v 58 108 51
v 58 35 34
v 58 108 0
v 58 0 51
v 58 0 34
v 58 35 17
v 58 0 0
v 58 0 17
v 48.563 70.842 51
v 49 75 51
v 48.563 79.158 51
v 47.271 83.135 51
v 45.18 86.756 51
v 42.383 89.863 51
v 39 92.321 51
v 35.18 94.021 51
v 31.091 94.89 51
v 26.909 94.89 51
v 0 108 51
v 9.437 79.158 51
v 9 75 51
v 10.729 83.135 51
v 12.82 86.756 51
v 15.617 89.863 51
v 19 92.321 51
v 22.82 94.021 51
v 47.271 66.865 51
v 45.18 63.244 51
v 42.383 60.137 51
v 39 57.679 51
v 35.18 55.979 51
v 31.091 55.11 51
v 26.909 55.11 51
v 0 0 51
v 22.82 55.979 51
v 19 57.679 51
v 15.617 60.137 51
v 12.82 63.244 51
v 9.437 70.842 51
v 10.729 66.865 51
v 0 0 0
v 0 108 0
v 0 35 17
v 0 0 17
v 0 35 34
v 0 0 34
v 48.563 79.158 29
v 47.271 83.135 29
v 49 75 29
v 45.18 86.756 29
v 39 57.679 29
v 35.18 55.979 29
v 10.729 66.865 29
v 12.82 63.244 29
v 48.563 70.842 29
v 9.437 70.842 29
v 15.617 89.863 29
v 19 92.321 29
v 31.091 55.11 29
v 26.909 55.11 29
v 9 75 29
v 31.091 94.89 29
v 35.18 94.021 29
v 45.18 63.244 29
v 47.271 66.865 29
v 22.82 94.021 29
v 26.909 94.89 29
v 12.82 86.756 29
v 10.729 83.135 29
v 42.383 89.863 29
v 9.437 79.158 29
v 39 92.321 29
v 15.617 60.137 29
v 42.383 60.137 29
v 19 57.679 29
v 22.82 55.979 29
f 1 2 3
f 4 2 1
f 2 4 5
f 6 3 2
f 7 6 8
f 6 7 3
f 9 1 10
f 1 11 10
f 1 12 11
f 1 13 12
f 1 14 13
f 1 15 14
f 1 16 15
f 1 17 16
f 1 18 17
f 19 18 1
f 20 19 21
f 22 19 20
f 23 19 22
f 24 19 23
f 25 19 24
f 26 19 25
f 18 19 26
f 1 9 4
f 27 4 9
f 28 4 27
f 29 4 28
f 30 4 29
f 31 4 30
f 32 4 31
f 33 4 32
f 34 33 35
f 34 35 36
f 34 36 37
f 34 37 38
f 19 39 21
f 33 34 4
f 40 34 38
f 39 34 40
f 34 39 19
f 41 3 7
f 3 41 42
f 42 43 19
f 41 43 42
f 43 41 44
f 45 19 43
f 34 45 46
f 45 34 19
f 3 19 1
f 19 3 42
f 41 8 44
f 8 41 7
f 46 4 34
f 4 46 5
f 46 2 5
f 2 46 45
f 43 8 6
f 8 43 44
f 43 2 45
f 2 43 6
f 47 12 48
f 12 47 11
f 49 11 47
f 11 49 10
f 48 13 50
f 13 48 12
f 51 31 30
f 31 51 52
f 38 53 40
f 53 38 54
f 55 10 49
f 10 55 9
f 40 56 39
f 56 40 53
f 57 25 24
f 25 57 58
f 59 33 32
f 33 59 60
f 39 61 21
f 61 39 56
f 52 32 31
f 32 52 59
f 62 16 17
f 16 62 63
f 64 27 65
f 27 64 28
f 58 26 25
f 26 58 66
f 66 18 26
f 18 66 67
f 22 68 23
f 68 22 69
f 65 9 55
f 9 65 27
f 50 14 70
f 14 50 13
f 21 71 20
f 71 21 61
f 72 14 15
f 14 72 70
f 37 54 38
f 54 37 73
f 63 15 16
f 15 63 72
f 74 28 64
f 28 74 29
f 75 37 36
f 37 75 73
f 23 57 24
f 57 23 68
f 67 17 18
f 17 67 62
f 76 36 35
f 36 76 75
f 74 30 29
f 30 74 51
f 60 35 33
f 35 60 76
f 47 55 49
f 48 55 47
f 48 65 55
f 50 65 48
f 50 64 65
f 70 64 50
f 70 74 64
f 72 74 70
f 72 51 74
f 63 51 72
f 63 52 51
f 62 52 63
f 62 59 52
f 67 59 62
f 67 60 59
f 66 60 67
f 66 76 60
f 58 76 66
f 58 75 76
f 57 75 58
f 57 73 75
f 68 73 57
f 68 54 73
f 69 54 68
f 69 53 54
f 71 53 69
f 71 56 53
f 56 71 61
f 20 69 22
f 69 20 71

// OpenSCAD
l_fyrstikkeske = 58;
h_fyrstikkeske = 17;
d_fyrstikkeske = 36;

diameter_telys = 40;
h_telys = 23;

l_holder = l_fyrstikkeske;
h_holder = 3*h_fyrstikkeske;
d_holder = 3*d_fyrstikkeske;

module fyrstikkeske(){
    
    cube([l_fyrstikkeske,d_fyrstikkeske,h_fyrstikkeske]);
}

module telys(){
    cylinder(h_telys, d=diameter_telys);
}

module telys_plassering(y){
    
    translate([l_holder/2,diameter_telys/2+y, h_holder-h_telys+1]){
        telys();
    }
}

fyrstikkeske();


avstand_mellom_telys_senter = diameter_telys+10;

difference(){
    cube([l_fyrstikkeske, d_holder, h_holder]);
    translate([0,-1,h_fyrstikkeske]) fyrstikkeske();
    telys_plassering(avstand_mellom_telys_senter+5);
    //telys_plassering(avstand_mellom_telys_senter*2+5);
    //telys_plassering(avstand_mellom_telys_senter*3+5);
}
